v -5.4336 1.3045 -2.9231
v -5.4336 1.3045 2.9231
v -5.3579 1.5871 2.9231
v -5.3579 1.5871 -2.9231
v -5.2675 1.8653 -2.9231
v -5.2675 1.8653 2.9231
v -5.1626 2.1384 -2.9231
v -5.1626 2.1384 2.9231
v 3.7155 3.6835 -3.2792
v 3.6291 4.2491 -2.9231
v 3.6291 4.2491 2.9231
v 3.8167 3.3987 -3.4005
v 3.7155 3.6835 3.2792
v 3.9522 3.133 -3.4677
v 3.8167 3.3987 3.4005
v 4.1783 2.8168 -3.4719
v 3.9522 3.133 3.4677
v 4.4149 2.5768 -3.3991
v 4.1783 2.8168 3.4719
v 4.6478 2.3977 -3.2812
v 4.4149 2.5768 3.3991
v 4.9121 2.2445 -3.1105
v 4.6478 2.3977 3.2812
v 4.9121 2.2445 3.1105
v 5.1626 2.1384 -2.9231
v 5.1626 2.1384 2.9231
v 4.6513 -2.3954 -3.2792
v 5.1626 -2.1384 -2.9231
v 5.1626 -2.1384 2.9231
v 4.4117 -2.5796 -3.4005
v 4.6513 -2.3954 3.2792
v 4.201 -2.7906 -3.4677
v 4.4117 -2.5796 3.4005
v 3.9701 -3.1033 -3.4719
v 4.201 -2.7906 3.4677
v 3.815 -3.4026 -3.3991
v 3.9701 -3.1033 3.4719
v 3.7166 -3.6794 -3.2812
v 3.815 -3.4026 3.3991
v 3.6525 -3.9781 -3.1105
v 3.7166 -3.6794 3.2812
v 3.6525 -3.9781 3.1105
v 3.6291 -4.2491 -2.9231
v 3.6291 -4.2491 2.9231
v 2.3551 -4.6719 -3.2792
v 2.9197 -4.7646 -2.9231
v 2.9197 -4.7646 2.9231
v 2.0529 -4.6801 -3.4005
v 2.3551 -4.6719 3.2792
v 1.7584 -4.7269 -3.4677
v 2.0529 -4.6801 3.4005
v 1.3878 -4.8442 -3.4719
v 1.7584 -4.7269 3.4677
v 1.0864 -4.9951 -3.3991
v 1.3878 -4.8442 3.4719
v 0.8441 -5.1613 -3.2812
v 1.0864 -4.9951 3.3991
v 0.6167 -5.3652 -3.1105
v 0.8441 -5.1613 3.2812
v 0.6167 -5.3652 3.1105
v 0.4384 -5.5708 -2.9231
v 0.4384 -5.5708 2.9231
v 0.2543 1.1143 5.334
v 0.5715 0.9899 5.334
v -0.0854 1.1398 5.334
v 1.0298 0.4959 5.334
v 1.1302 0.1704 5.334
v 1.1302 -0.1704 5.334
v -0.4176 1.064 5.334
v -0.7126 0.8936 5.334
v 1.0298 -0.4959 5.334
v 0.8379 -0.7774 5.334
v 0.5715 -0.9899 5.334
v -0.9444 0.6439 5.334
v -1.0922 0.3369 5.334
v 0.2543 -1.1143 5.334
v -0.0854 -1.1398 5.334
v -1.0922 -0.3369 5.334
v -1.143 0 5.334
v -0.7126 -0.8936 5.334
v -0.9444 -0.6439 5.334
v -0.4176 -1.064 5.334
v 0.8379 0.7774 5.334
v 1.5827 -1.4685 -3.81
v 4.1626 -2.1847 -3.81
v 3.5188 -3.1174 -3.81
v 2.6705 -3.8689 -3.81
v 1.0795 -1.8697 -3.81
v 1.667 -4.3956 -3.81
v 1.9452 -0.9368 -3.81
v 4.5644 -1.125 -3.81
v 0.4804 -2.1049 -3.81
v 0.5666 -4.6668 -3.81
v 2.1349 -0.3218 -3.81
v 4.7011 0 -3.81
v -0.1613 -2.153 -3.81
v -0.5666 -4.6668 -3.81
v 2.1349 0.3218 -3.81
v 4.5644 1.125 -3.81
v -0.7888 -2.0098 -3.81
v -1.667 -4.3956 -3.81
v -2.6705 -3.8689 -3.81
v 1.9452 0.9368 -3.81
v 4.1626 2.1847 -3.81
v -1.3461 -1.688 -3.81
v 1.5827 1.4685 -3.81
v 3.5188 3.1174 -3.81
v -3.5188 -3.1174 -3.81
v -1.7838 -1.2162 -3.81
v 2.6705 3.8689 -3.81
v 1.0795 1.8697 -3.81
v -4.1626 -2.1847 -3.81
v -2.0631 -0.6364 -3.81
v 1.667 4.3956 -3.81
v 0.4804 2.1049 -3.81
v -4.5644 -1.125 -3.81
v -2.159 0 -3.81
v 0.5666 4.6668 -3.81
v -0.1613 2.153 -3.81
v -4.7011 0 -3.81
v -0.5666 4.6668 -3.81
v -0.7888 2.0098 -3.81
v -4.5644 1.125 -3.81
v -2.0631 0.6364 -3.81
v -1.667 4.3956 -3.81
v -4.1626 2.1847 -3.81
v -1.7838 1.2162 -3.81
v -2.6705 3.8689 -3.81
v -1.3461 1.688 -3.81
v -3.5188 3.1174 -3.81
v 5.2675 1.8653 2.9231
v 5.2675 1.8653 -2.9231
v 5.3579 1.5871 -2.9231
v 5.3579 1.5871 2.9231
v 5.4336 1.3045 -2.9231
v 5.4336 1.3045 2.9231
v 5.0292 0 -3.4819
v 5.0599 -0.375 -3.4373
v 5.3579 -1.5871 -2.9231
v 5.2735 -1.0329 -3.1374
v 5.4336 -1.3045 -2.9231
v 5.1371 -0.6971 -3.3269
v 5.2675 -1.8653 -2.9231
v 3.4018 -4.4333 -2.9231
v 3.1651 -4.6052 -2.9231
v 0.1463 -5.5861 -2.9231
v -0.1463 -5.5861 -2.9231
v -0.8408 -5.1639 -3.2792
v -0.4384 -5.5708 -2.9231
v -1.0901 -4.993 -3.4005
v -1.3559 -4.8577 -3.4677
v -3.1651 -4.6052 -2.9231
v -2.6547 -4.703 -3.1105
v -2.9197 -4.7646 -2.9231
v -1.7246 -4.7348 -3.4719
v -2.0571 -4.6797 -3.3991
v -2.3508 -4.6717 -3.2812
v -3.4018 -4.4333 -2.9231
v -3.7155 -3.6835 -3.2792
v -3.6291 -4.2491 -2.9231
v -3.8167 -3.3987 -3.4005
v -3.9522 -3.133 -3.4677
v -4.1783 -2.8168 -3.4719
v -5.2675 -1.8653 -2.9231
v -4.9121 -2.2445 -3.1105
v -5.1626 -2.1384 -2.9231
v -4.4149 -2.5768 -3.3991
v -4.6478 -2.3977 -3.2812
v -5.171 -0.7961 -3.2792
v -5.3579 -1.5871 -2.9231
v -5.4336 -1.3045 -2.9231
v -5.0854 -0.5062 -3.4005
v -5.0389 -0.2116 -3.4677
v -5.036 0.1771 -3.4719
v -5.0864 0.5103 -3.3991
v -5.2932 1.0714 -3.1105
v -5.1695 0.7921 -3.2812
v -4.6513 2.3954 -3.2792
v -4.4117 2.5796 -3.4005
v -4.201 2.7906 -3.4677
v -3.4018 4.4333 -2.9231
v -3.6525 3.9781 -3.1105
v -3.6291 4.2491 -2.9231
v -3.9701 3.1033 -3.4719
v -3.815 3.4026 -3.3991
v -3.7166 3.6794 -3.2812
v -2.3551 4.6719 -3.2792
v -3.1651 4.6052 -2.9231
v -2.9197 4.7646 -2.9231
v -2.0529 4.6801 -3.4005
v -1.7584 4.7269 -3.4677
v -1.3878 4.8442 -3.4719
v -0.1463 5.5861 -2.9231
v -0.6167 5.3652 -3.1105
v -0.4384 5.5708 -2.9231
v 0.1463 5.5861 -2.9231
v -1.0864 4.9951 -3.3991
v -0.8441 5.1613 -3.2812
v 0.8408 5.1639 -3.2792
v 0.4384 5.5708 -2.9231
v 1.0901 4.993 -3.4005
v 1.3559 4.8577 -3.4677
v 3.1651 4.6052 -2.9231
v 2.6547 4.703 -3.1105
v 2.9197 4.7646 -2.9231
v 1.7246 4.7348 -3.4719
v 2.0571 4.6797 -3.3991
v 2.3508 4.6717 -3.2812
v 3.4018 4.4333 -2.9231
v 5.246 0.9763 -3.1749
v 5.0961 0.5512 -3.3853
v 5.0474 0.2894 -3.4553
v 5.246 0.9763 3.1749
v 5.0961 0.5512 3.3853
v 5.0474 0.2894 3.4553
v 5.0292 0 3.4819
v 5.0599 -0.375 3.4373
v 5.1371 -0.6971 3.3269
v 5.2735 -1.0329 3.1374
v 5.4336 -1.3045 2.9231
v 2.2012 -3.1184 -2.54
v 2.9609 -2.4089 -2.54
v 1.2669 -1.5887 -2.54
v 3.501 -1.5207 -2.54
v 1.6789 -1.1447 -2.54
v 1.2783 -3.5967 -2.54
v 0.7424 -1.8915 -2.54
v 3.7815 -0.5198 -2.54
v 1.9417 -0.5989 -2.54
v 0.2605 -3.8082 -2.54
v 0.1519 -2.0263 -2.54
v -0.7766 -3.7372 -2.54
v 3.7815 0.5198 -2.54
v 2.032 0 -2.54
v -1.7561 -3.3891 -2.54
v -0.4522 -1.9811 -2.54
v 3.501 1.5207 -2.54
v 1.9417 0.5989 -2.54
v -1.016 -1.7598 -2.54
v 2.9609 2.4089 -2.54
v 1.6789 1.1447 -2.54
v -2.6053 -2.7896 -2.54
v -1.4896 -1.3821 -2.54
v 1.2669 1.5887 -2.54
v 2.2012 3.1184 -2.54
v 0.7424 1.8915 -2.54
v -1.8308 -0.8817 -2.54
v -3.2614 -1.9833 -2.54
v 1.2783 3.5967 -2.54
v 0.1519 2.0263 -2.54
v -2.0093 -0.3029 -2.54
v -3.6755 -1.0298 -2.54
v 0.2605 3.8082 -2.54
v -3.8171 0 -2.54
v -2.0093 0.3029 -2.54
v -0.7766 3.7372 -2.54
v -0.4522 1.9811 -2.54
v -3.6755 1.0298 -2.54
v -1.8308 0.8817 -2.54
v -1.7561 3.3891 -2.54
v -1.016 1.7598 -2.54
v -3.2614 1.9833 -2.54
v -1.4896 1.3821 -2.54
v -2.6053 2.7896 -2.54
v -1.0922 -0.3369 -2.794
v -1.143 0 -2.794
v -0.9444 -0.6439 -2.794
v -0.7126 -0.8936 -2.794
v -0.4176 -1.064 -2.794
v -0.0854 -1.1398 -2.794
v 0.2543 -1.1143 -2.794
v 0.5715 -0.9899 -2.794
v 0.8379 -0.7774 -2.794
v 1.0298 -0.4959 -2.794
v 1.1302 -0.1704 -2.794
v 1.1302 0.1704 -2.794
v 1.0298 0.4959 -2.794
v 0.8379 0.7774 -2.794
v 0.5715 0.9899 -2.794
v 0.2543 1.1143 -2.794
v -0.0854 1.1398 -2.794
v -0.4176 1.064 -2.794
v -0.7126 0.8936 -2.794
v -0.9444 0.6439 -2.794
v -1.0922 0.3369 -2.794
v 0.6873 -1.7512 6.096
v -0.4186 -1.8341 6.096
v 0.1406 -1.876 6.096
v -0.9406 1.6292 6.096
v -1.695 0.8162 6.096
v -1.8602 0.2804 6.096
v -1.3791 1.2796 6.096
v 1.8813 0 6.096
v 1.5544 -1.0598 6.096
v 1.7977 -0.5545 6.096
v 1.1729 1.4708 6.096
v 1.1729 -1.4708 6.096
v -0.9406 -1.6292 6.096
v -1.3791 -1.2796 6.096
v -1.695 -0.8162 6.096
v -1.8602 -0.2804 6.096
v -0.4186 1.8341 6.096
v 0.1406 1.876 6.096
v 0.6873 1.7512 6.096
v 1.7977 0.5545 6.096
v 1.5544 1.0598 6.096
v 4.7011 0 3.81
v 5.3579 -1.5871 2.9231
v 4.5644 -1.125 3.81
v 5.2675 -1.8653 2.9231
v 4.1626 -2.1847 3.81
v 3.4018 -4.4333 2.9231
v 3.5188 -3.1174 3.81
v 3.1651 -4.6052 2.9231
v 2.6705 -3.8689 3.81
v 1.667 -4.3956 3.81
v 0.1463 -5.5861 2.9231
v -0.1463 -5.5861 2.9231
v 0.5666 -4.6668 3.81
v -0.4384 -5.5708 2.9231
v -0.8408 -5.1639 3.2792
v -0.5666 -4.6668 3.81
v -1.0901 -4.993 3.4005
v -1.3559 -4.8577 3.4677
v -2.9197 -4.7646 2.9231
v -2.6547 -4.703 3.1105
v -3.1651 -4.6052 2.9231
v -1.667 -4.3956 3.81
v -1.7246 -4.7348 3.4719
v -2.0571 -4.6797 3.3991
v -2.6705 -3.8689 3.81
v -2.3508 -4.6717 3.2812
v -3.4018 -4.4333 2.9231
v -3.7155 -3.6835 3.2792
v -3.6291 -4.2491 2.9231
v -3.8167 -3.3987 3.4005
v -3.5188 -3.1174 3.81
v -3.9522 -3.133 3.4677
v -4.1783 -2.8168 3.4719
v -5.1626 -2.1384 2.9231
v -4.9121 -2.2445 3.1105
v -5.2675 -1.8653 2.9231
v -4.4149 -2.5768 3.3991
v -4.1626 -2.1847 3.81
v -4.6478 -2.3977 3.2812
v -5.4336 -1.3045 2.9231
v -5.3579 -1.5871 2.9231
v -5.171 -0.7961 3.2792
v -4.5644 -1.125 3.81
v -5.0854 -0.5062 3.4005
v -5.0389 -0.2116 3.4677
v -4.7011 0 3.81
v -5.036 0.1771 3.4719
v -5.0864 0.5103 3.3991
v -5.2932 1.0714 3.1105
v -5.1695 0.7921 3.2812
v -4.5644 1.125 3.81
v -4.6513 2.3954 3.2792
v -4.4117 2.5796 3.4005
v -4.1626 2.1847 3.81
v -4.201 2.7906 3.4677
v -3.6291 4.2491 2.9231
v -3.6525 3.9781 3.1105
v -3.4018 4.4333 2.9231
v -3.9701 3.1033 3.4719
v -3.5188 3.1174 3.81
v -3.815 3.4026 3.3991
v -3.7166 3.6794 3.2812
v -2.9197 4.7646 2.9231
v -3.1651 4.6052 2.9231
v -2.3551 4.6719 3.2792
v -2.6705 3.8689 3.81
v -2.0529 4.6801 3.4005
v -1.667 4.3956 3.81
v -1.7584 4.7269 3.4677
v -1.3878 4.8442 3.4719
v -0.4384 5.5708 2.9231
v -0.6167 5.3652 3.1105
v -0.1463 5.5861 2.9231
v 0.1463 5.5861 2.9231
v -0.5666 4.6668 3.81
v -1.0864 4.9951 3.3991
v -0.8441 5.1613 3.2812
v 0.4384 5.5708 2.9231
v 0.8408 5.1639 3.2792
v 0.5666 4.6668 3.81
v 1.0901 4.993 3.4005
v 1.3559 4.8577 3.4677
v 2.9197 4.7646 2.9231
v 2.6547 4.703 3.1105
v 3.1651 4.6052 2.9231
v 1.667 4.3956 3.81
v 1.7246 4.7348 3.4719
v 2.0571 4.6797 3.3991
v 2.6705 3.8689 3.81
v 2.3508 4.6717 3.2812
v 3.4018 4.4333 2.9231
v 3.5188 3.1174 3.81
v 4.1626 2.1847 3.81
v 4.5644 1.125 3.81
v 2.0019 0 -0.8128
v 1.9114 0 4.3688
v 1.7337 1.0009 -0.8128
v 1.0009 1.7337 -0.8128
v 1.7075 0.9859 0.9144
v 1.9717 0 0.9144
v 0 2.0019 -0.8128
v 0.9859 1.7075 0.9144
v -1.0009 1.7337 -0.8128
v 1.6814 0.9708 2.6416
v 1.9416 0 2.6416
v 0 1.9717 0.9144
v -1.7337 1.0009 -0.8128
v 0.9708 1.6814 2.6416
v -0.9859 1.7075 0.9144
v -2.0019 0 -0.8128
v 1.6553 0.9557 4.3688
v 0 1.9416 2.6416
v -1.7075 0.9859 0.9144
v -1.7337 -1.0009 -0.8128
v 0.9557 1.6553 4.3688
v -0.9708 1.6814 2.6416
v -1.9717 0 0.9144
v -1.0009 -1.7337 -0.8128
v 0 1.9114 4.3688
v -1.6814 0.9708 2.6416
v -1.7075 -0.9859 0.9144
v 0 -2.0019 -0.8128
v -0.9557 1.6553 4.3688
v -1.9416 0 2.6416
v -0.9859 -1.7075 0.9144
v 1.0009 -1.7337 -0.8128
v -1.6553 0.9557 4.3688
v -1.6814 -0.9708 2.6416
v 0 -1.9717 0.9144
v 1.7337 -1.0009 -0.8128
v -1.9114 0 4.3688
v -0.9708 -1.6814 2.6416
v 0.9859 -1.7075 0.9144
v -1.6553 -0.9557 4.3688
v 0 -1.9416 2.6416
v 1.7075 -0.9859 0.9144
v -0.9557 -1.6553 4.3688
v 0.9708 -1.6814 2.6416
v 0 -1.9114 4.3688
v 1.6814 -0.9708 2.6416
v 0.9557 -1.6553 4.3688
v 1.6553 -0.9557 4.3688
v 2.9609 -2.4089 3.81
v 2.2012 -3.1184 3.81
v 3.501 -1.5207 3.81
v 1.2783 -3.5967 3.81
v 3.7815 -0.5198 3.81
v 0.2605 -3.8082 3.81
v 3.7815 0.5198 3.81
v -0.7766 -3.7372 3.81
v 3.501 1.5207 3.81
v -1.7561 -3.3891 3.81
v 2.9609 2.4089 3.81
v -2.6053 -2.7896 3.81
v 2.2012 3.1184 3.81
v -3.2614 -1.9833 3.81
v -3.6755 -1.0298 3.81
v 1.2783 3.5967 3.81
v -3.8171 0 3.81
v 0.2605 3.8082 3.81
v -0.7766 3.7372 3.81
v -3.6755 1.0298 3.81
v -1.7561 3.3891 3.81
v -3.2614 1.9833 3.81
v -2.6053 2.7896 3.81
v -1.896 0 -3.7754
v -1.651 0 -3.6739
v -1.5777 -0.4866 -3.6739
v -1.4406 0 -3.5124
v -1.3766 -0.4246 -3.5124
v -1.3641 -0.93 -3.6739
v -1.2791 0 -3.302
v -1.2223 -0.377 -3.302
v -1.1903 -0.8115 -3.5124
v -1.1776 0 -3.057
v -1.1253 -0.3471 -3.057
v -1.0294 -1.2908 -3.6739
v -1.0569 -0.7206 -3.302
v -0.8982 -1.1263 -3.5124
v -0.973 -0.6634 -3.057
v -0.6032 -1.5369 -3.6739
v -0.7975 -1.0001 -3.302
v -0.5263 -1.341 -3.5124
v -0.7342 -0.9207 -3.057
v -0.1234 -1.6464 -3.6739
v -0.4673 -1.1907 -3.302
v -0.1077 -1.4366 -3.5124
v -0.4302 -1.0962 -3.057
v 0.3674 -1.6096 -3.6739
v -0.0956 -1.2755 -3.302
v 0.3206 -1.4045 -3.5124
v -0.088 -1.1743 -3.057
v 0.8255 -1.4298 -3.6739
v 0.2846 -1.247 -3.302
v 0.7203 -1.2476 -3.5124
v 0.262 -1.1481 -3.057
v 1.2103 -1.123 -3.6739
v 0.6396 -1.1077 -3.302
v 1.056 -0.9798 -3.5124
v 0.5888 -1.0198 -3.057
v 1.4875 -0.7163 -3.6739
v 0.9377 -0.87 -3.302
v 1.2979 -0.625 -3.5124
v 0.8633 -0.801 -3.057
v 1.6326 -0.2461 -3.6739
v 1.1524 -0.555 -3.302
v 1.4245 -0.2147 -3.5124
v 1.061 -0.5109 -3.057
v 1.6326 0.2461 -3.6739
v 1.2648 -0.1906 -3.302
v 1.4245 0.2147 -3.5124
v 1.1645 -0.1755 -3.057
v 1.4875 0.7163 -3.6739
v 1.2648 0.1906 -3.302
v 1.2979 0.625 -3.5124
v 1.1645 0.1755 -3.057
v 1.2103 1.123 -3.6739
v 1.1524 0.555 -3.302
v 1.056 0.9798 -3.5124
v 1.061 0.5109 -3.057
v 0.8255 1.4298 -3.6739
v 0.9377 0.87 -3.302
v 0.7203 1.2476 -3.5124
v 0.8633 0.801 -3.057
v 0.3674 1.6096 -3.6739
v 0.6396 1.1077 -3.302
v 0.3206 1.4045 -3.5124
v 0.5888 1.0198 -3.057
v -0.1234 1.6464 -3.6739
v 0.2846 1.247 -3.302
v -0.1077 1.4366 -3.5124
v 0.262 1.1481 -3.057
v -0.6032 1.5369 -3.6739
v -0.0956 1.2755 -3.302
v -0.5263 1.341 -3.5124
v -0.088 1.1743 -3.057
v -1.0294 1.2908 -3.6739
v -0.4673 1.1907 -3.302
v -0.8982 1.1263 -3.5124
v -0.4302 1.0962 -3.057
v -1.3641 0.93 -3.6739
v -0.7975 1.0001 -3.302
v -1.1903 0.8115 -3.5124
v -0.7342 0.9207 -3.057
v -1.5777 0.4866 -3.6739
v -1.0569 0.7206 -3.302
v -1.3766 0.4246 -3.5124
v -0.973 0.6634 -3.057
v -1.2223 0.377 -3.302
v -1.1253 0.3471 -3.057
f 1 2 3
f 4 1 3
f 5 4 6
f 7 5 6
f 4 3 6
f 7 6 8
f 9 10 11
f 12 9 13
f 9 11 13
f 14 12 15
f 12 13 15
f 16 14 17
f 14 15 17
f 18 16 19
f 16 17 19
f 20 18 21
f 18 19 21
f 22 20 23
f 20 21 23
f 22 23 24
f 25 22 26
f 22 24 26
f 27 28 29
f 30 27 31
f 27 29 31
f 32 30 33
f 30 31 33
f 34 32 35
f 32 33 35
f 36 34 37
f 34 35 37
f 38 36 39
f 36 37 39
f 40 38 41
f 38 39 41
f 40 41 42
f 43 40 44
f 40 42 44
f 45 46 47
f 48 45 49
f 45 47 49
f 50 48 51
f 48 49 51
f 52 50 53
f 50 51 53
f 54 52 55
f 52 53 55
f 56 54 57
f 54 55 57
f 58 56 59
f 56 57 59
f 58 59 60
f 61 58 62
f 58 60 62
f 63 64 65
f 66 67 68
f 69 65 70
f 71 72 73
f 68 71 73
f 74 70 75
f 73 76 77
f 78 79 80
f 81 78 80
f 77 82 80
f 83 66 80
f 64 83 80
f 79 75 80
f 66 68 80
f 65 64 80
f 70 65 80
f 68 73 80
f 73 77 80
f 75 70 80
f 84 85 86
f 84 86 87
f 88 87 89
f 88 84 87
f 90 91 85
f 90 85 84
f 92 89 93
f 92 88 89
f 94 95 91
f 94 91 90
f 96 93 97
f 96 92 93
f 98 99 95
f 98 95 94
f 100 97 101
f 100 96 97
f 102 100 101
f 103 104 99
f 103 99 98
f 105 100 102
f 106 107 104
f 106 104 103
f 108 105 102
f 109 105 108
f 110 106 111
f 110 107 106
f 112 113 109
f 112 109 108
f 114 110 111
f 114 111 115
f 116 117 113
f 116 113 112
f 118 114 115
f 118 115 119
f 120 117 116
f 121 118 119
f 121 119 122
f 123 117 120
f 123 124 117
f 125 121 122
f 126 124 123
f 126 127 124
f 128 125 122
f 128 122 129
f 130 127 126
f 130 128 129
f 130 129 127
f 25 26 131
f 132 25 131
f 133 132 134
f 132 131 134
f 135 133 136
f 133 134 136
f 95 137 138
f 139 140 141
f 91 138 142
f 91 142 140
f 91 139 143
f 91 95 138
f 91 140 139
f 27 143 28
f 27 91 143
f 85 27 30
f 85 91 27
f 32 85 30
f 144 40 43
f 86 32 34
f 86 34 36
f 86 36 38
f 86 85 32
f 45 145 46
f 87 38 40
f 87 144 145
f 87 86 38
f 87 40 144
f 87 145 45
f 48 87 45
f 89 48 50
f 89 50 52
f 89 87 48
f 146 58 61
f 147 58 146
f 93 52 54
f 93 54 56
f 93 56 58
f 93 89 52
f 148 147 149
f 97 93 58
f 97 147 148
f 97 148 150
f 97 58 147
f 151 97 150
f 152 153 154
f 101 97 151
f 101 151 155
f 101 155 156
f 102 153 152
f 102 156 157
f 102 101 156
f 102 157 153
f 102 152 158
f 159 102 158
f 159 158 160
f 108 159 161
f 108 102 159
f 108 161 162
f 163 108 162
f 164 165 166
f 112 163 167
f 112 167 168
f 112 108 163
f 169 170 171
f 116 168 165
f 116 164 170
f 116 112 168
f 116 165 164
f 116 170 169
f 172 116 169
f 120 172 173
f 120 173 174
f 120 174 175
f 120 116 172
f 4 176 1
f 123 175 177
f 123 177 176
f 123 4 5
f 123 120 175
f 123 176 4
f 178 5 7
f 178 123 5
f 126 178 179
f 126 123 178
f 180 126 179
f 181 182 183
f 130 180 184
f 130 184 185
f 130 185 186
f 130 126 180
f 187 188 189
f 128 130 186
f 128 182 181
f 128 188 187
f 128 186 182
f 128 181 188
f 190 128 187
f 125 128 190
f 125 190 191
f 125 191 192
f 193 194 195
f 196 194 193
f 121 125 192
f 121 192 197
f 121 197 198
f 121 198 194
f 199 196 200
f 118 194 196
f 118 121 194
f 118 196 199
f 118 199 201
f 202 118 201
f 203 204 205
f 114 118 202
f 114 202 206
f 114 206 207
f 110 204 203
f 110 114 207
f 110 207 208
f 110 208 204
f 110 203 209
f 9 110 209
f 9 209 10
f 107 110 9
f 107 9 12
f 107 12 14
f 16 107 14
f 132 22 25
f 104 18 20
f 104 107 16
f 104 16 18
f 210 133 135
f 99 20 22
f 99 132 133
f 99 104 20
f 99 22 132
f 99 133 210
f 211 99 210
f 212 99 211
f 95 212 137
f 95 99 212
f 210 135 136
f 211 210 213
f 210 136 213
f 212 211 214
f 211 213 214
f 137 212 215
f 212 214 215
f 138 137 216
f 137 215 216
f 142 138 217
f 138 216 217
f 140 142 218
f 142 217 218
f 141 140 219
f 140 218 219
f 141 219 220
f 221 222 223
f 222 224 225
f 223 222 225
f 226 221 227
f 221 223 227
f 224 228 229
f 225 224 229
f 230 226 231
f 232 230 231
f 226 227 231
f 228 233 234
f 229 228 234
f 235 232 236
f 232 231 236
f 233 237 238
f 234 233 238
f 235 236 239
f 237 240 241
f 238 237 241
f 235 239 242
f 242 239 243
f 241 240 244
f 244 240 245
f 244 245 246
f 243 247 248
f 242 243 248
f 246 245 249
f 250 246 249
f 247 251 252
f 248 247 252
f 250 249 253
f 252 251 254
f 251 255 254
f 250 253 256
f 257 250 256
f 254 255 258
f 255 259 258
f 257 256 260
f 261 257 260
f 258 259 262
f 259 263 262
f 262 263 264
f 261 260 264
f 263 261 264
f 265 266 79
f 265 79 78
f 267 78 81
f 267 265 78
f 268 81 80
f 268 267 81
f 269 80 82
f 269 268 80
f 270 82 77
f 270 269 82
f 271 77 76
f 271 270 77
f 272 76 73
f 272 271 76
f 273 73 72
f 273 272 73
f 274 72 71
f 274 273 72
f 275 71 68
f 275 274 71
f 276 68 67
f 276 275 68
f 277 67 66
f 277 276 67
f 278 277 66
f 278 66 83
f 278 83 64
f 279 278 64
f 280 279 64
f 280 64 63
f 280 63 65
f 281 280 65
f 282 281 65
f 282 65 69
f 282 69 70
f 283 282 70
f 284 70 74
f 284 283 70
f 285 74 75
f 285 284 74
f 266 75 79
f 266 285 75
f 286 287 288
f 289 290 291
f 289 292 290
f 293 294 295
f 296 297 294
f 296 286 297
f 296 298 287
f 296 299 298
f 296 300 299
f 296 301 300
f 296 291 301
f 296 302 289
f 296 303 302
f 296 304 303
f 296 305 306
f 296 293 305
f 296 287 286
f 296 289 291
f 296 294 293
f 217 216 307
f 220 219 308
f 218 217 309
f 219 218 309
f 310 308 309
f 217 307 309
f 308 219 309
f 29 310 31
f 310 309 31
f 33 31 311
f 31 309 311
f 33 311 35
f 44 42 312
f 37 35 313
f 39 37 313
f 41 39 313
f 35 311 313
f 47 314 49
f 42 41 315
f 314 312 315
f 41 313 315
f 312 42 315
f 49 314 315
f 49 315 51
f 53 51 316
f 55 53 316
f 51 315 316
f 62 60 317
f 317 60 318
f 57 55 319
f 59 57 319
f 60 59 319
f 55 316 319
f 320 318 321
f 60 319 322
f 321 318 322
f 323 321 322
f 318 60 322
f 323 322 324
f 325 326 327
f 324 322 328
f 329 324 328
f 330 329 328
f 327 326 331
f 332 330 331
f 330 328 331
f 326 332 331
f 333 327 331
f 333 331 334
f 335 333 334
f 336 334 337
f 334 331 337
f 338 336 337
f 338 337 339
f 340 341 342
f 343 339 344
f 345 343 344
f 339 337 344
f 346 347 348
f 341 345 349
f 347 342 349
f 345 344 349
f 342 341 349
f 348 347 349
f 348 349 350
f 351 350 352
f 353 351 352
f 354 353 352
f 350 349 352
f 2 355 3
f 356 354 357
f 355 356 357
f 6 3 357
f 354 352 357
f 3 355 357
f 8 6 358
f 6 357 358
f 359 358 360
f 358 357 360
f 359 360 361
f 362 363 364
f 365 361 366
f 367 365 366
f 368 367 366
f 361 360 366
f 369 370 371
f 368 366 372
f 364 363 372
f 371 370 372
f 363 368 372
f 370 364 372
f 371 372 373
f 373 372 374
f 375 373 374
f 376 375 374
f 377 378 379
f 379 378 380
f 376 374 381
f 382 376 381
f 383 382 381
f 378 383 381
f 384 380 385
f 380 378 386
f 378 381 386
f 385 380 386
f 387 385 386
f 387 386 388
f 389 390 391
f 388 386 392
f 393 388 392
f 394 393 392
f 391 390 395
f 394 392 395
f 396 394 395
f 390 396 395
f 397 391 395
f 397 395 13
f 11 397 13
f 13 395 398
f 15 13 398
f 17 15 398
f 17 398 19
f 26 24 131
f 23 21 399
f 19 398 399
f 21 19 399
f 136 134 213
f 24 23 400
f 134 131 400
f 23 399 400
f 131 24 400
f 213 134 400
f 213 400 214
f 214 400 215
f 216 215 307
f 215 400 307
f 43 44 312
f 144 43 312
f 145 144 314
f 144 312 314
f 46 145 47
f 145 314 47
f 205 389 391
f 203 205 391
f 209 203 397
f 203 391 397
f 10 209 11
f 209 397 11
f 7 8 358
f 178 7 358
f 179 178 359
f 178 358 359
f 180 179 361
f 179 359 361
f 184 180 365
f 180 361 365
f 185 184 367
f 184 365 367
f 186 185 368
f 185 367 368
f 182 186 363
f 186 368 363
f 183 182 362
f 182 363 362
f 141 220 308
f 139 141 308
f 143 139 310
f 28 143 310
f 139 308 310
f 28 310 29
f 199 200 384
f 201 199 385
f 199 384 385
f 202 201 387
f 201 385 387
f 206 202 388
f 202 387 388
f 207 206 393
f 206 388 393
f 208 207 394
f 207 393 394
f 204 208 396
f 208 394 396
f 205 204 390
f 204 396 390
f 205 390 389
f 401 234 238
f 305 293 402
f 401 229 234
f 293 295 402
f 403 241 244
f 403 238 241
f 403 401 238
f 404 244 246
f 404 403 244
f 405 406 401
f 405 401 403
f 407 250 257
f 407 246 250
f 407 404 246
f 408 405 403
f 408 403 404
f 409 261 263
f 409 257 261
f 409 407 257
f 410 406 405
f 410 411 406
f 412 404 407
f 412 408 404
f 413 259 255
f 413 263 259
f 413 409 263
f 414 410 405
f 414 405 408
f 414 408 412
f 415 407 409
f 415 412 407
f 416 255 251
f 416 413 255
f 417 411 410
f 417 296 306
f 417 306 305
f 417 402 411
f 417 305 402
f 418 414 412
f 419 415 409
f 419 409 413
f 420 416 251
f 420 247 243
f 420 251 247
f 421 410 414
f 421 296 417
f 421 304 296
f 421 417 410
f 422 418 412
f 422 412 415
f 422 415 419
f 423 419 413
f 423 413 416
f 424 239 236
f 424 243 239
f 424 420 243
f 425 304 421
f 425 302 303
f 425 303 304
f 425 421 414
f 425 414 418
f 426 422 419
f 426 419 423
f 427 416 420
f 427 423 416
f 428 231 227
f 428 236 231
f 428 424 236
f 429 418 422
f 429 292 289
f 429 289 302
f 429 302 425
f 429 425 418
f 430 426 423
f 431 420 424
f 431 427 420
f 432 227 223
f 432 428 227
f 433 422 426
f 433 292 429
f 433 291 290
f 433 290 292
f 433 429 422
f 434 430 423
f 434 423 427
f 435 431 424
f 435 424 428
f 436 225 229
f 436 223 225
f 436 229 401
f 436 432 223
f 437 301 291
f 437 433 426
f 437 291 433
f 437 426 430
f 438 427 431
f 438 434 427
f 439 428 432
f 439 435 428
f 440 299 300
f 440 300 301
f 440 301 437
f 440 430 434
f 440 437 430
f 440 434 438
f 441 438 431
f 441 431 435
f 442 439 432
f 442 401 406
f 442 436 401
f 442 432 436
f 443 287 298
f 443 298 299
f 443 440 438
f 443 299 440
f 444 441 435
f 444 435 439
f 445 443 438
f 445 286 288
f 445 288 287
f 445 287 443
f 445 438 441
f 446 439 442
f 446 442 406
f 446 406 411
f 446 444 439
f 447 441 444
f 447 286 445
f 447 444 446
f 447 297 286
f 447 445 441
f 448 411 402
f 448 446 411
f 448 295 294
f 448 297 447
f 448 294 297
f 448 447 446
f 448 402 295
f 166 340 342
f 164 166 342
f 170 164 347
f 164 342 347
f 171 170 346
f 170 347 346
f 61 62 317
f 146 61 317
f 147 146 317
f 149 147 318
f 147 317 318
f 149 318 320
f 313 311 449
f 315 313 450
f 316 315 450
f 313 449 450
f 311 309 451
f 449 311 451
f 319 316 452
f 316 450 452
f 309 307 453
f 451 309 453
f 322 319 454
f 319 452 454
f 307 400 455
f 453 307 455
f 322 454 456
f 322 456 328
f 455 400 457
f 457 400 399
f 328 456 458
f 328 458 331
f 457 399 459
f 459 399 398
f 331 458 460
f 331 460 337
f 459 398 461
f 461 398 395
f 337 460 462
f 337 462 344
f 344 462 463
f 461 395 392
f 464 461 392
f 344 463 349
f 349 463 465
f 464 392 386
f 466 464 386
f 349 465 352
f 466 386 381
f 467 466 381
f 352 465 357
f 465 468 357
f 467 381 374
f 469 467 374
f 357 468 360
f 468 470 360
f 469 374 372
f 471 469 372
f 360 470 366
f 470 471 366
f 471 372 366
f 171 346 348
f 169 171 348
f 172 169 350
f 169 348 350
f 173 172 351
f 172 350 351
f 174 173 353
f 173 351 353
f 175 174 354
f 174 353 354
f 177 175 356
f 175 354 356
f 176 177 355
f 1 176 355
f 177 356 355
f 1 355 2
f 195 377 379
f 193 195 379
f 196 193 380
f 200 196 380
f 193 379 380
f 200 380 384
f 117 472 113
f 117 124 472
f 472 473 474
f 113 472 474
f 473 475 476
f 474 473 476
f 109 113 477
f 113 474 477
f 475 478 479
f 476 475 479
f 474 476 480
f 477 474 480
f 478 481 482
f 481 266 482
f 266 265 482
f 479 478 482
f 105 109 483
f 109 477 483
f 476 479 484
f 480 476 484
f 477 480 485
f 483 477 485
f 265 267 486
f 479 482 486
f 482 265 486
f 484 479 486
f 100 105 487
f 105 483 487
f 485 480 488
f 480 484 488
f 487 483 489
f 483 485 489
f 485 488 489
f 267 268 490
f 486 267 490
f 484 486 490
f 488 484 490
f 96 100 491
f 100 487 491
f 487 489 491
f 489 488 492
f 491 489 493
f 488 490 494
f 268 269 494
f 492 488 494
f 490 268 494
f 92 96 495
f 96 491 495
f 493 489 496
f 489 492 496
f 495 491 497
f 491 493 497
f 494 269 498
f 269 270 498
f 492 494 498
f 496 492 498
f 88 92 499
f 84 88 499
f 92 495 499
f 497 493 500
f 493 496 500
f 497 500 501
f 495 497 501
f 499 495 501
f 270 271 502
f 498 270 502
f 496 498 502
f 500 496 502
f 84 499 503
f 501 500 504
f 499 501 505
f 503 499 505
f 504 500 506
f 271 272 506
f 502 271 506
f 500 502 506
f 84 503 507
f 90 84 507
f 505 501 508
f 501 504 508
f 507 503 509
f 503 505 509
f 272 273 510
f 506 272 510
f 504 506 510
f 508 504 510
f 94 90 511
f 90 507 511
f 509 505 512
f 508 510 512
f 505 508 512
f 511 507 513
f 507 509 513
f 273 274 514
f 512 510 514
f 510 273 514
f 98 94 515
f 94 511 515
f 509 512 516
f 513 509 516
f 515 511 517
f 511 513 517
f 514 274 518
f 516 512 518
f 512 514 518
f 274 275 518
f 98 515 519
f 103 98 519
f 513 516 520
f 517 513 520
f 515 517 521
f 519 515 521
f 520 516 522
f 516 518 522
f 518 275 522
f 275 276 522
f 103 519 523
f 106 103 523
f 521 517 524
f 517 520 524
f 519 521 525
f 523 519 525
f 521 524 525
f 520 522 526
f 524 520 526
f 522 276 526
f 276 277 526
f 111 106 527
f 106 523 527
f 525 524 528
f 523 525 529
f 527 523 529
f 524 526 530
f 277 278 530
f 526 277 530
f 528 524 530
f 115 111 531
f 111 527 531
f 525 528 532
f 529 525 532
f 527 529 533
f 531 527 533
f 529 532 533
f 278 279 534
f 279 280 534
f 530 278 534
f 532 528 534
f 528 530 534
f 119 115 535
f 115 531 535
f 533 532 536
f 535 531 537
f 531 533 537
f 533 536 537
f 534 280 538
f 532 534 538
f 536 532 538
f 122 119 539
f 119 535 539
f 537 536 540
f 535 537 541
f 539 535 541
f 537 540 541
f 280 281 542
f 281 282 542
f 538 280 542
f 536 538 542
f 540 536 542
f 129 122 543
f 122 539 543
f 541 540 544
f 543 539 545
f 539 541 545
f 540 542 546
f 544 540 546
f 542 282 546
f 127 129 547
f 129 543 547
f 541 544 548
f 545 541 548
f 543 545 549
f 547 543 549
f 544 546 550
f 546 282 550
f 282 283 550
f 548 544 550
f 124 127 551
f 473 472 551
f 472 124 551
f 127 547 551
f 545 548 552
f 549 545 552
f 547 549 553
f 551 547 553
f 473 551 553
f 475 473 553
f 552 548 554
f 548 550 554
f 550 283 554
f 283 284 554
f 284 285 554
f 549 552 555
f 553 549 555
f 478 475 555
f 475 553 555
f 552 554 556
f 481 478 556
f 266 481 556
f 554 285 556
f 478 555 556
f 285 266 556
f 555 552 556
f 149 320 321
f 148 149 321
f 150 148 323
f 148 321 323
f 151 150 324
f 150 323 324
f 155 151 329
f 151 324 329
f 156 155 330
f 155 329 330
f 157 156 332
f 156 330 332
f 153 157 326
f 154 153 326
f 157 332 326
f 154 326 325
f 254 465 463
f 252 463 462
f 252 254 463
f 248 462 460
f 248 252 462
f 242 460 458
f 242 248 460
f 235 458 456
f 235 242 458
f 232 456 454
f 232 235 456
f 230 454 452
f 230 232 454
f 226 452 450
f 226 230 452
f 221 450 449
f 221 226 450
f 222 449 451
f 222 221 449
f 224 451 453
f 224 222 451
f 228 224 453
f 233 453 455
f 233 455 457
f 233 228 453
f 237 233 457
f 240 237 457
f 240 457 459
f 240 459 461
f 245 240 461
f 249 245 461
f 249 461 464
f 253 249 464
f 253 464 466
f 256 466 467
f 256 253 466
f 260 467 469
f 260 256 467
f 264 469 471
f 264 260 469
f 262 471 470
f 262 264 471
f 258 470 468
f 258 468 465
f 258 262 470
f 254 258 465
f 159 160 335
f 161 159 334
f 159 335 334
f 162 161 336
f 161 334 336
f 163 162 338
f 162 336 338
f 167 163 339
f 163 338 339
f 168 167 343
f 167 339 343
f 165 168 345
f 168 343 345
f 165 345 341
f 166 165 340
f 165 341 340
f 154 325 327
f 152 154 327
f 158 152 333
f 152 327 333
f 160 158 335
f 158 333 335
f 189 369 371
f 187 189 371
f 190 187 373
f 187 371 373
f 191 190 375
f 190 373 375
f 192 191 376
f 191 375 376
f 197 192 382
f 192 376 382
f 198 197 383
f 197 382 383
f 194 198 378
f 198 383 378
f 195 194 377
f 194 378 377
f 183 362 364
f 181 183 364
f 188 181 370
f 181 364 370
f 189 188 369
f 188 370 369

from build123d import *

# Parameters (mm, degrees)
SKETCH20_R          = 3.817056353
BOSS_EXTRUDE1_DEPTH = 3.81
BOSS_EXTRUDE2_START = -1.27
BOSS_EXTRUDE2_DEPTH = 1.27
SKETCH23_R          = 2.032
BOSS_EXTRUDE3_DEPTH = 8.636
BOSS_EXTRUDE3_TAPER = 1
SKETCH24_R          = 1.143
CUT_EXTRUDE1_DEPTH  = 9.144
FILLET1_R           = 1.016


with BuildPart() as part:
    # Sketch20 → Boss-Extrude1 (new, symmetric)
    with BuildSketch(Plane.XY):
        with BuildLine():
            ThreePointArc((-2.91972198, 4.764553238), (-1.554108268, 4.783053432), (-0.438429427, 5.570774061))
            ThreePointArc((-0.438429427, 5.570774061), (0, 5.588), (0.438429427, 5.570774061))
            ThreePointArc((0.438429427, 5.570774061), (1.554108268, 4.783053432), (2.91972198, 4.764553238))
            ThreePointArc((2.91972198, 4.764553238), (3.28454399, 4.520786965), (3.629115694, 4.249148536))
            ThreePointArc((3.629115694, 4.249148536), (4.068708268, 2.956089591), (5.162638828, 2.13843502))
            ThreePointArc((5.162638828, 2.13843502), (5.314503813, 1.726786965), (5.433603115, 1.304492693))
            ThreePointArc((5.433603115, 1.304492693), (5.0292, 0), (5.433603115, -1.304492693))
            ThreePointArc((5.433603115, -1.304492693), (5.314503813, -1.726786965), (5.162638828, -2.13843502))
            ThreePointArc((5.162638828, -2.13843502), (4.068708268, -2.956089591), (3.629115694, -4.249148536))
            ThreePointArc((3.629115694, -4.249148536), (3.28454399, -4.520786965), (2.91972198, -4.764553238))
            ThreePointArc((2.91972198, -4.764553238), (1.554108268, -4.783053432), (0.438429427, -5.570774061))
            ThreePointArc((0.438429427, -5.570774061), (0, -5.588), (-0.438429427, -5.570774061))
            ThreePointArc((-0.438429427, -5.570774061), (-1.554108268, -4.783053432), (-2.91972198, -4.764553238))
            ThreePointArc((-2.91972198, -4.764553238), (-3.28454399, -4.520786965), (-3.629115694, -4.249148536))
            ThreePointArc((-3.629115694, -4.249148536), (-4.068708268, -2.956089591), (-5.162638828, -2.13843502))
            ThreePointArc((-5.162638828, -2.13843502), (-5.314503813, -1.726786965), (-5.433603115, -1.304492693))
            ThreePointArc((-5.433603115, -1.304492693), (-5.0292, 0), (-5.433603115, 1.304492693))
            ThreePointArc((-5.433603115, 1.304492693), (-5.314503813, 1.726786965), (-5.162638828, 2.13843502))
            ThreePointArc((-5.162638828, 2.13843502), (-4.068708268, 2.956089591), (-3.629115694, 4.249148536))
            ThreePointArc((-3.629115694, 4.249148536), (-3.28454399, 4.520786965), (-2.91972198, 4.764553238))
        make_face()
        with Locations(Location((0, 0, 0), (0, 0, 180))):
            Circle(SKETCH20_R, mode=Mode.SUBTRACT)
    extrude(amount=BOSS_EXTRUDE1_DEPTH, both=True)

    # Sketch21 → Boss-Extrude2 (add)
    with BuildSketch(Plane(origin=(0, 0, -3.81), x_dir=(-1, 0, 0), z_dir=(0, 0, -1)).offset(BOSS_EXTRUDE2_START)):
        with BuildLine():
            ThreePointArc((3.629115694, 4.249148536), (3.28454399, 4.520786965), (2.91972198, 4.764553238))
            ThreePointArc((2.91972198, 4.764553238), (1.554108268, 4.783053432), (0.438429427, 5.570774061))
            ThreePointArc((0.438429427, 5.570774061), (0, 5.588), (-0.438429427, 5.570774061))
            ThreePointArc((-0.438429427, 5.570774061), (-1.554108268, 4.783053432), (-2.91972198, 4.764553238))
            ThreePointArc((-2.91972198, 4.764553238), (-3.28454399, 4.520786965), (-3.629115694, 4.249148536))
            ThreePointArc((-3.629115694, 4.249148536), (-4.068708268, 2.956089591), (-5.162638828, 2.13843502))
            ThreePointArc((-5.162638828, 2.13843502), (-5.314503813, 1.726786965), (-5.433603115, 1.304492693))
            ThreePointArc((-5.433603115, 1.304492693), (-5.0292, 0), (-5.433603115, -1.304492693))
            ThreePointArc((-5.433603115, -1.304492693), (-5.314503813, -1.726786965), (-5.162638828, -2.13843502))
            ThreePointArc((-5.162638828, -2.13843502), (-4.068708268, -2.956089591), (-3.629115694, -4.249148536))
            ThreePointArc((-3.629115694, -4.249148536), (-3.28454399, -4.520786965), (-2.91972198, -4.764553238))
            ThreePointArc((-2.91972198, -4.764553238), (-1.554108268, -4.783053432), (-0.438429427, -5.570774061))
            ThreePointArc((-0.438429427, -5.570774061), (0, -5.588), (0.438429427, -5.570774061))
            ThreePointArc((0.438429427, -5.570774061), (1.554108268, -4.783053432), (2.91972198, -4.764553238))
            ThreePointArc((2.91972198, -4.764553238), (3.28454399, -4.520786965), (3.629115694, -4.249148536))
            ThreePointArc((3.629115694, -4.249148536), (4.068708268, -2.956089591), (5.162638828, -2.13843502))
            ThreePointArc((5.162638828, -2.13843502), (5.314503813, -1.726786965), (5.433603115, -1.304492693))
            ThreePointArc((5.433603115, -1.304492693), (5.0292, 0), (5.433603115, 1.304492693))
            ThreePointArc((5.433603115, 1.304492693), (5.314503813, 1.726786965), (5.162638828, 2.13843502))
            ThreePointArc((5.162638828, 2.13843502), (4.068708268, 2.956089591), (3.629115694, 4.249148536))
        make_face()
    extrude(amount=BOSS_EXTRUDE2_DEPTH)

    # Sketch23 → Boss-Extrude3 (add)
    with BuildSketch(Plane.XY.offset(-2.54)):
        Circle(SKETCH23_R)
    extrude(amount=BOSS_EXTRUDE3_DEPTH, taper=BOSS_EXTRUDE3_TAPER)

    # Sketch24 → Cut-Extrude1 (cut)
    with BuildSketch(Plane.XY.offset(-3.81)):
        with Locations(Location((0, 0, 0), (0, 0, 180))):
            Circle(SKETCH24_R)
    extrude(amount=CUT_EXTRUDE1_DEPTH, mode=Mode.SUBTRACT)

    # Sketch25 → Cut-Revolve1 (revolve, cut)
    with BuildSketch(Plane(origin=(0, 0, 0), x_dir=(0, 0, -1), z_dir=(1, 0, 0)), mode=Mode.PRIVATE) as cut_revolve1_sk:
        Polygon((2.923053238, 5.588), (3.81, 4.701053238), (3.81, 5.588), align=None)
        Polygon((-3.81, 5.588), (-2.923053238, 5.588), (-3.81, 4.701053238), align=None)
    revolve(cut_revolve1_sk.sketch.rotate(Axis((0, 0, 0), (0, 0, -1)), 90), axis=Axis((0, 0, 0), (0, 0, -1)), mode=Mode.SUBTRACT)

    # Fillet1
    fillet1_edges = [part.edges().sort_by_distance(p)[0] for p in [
        (1.143, 0, -3.81),
    ]]
    fillet(fillet1_edges, radius=FILLET1_R)


solid = part.part
